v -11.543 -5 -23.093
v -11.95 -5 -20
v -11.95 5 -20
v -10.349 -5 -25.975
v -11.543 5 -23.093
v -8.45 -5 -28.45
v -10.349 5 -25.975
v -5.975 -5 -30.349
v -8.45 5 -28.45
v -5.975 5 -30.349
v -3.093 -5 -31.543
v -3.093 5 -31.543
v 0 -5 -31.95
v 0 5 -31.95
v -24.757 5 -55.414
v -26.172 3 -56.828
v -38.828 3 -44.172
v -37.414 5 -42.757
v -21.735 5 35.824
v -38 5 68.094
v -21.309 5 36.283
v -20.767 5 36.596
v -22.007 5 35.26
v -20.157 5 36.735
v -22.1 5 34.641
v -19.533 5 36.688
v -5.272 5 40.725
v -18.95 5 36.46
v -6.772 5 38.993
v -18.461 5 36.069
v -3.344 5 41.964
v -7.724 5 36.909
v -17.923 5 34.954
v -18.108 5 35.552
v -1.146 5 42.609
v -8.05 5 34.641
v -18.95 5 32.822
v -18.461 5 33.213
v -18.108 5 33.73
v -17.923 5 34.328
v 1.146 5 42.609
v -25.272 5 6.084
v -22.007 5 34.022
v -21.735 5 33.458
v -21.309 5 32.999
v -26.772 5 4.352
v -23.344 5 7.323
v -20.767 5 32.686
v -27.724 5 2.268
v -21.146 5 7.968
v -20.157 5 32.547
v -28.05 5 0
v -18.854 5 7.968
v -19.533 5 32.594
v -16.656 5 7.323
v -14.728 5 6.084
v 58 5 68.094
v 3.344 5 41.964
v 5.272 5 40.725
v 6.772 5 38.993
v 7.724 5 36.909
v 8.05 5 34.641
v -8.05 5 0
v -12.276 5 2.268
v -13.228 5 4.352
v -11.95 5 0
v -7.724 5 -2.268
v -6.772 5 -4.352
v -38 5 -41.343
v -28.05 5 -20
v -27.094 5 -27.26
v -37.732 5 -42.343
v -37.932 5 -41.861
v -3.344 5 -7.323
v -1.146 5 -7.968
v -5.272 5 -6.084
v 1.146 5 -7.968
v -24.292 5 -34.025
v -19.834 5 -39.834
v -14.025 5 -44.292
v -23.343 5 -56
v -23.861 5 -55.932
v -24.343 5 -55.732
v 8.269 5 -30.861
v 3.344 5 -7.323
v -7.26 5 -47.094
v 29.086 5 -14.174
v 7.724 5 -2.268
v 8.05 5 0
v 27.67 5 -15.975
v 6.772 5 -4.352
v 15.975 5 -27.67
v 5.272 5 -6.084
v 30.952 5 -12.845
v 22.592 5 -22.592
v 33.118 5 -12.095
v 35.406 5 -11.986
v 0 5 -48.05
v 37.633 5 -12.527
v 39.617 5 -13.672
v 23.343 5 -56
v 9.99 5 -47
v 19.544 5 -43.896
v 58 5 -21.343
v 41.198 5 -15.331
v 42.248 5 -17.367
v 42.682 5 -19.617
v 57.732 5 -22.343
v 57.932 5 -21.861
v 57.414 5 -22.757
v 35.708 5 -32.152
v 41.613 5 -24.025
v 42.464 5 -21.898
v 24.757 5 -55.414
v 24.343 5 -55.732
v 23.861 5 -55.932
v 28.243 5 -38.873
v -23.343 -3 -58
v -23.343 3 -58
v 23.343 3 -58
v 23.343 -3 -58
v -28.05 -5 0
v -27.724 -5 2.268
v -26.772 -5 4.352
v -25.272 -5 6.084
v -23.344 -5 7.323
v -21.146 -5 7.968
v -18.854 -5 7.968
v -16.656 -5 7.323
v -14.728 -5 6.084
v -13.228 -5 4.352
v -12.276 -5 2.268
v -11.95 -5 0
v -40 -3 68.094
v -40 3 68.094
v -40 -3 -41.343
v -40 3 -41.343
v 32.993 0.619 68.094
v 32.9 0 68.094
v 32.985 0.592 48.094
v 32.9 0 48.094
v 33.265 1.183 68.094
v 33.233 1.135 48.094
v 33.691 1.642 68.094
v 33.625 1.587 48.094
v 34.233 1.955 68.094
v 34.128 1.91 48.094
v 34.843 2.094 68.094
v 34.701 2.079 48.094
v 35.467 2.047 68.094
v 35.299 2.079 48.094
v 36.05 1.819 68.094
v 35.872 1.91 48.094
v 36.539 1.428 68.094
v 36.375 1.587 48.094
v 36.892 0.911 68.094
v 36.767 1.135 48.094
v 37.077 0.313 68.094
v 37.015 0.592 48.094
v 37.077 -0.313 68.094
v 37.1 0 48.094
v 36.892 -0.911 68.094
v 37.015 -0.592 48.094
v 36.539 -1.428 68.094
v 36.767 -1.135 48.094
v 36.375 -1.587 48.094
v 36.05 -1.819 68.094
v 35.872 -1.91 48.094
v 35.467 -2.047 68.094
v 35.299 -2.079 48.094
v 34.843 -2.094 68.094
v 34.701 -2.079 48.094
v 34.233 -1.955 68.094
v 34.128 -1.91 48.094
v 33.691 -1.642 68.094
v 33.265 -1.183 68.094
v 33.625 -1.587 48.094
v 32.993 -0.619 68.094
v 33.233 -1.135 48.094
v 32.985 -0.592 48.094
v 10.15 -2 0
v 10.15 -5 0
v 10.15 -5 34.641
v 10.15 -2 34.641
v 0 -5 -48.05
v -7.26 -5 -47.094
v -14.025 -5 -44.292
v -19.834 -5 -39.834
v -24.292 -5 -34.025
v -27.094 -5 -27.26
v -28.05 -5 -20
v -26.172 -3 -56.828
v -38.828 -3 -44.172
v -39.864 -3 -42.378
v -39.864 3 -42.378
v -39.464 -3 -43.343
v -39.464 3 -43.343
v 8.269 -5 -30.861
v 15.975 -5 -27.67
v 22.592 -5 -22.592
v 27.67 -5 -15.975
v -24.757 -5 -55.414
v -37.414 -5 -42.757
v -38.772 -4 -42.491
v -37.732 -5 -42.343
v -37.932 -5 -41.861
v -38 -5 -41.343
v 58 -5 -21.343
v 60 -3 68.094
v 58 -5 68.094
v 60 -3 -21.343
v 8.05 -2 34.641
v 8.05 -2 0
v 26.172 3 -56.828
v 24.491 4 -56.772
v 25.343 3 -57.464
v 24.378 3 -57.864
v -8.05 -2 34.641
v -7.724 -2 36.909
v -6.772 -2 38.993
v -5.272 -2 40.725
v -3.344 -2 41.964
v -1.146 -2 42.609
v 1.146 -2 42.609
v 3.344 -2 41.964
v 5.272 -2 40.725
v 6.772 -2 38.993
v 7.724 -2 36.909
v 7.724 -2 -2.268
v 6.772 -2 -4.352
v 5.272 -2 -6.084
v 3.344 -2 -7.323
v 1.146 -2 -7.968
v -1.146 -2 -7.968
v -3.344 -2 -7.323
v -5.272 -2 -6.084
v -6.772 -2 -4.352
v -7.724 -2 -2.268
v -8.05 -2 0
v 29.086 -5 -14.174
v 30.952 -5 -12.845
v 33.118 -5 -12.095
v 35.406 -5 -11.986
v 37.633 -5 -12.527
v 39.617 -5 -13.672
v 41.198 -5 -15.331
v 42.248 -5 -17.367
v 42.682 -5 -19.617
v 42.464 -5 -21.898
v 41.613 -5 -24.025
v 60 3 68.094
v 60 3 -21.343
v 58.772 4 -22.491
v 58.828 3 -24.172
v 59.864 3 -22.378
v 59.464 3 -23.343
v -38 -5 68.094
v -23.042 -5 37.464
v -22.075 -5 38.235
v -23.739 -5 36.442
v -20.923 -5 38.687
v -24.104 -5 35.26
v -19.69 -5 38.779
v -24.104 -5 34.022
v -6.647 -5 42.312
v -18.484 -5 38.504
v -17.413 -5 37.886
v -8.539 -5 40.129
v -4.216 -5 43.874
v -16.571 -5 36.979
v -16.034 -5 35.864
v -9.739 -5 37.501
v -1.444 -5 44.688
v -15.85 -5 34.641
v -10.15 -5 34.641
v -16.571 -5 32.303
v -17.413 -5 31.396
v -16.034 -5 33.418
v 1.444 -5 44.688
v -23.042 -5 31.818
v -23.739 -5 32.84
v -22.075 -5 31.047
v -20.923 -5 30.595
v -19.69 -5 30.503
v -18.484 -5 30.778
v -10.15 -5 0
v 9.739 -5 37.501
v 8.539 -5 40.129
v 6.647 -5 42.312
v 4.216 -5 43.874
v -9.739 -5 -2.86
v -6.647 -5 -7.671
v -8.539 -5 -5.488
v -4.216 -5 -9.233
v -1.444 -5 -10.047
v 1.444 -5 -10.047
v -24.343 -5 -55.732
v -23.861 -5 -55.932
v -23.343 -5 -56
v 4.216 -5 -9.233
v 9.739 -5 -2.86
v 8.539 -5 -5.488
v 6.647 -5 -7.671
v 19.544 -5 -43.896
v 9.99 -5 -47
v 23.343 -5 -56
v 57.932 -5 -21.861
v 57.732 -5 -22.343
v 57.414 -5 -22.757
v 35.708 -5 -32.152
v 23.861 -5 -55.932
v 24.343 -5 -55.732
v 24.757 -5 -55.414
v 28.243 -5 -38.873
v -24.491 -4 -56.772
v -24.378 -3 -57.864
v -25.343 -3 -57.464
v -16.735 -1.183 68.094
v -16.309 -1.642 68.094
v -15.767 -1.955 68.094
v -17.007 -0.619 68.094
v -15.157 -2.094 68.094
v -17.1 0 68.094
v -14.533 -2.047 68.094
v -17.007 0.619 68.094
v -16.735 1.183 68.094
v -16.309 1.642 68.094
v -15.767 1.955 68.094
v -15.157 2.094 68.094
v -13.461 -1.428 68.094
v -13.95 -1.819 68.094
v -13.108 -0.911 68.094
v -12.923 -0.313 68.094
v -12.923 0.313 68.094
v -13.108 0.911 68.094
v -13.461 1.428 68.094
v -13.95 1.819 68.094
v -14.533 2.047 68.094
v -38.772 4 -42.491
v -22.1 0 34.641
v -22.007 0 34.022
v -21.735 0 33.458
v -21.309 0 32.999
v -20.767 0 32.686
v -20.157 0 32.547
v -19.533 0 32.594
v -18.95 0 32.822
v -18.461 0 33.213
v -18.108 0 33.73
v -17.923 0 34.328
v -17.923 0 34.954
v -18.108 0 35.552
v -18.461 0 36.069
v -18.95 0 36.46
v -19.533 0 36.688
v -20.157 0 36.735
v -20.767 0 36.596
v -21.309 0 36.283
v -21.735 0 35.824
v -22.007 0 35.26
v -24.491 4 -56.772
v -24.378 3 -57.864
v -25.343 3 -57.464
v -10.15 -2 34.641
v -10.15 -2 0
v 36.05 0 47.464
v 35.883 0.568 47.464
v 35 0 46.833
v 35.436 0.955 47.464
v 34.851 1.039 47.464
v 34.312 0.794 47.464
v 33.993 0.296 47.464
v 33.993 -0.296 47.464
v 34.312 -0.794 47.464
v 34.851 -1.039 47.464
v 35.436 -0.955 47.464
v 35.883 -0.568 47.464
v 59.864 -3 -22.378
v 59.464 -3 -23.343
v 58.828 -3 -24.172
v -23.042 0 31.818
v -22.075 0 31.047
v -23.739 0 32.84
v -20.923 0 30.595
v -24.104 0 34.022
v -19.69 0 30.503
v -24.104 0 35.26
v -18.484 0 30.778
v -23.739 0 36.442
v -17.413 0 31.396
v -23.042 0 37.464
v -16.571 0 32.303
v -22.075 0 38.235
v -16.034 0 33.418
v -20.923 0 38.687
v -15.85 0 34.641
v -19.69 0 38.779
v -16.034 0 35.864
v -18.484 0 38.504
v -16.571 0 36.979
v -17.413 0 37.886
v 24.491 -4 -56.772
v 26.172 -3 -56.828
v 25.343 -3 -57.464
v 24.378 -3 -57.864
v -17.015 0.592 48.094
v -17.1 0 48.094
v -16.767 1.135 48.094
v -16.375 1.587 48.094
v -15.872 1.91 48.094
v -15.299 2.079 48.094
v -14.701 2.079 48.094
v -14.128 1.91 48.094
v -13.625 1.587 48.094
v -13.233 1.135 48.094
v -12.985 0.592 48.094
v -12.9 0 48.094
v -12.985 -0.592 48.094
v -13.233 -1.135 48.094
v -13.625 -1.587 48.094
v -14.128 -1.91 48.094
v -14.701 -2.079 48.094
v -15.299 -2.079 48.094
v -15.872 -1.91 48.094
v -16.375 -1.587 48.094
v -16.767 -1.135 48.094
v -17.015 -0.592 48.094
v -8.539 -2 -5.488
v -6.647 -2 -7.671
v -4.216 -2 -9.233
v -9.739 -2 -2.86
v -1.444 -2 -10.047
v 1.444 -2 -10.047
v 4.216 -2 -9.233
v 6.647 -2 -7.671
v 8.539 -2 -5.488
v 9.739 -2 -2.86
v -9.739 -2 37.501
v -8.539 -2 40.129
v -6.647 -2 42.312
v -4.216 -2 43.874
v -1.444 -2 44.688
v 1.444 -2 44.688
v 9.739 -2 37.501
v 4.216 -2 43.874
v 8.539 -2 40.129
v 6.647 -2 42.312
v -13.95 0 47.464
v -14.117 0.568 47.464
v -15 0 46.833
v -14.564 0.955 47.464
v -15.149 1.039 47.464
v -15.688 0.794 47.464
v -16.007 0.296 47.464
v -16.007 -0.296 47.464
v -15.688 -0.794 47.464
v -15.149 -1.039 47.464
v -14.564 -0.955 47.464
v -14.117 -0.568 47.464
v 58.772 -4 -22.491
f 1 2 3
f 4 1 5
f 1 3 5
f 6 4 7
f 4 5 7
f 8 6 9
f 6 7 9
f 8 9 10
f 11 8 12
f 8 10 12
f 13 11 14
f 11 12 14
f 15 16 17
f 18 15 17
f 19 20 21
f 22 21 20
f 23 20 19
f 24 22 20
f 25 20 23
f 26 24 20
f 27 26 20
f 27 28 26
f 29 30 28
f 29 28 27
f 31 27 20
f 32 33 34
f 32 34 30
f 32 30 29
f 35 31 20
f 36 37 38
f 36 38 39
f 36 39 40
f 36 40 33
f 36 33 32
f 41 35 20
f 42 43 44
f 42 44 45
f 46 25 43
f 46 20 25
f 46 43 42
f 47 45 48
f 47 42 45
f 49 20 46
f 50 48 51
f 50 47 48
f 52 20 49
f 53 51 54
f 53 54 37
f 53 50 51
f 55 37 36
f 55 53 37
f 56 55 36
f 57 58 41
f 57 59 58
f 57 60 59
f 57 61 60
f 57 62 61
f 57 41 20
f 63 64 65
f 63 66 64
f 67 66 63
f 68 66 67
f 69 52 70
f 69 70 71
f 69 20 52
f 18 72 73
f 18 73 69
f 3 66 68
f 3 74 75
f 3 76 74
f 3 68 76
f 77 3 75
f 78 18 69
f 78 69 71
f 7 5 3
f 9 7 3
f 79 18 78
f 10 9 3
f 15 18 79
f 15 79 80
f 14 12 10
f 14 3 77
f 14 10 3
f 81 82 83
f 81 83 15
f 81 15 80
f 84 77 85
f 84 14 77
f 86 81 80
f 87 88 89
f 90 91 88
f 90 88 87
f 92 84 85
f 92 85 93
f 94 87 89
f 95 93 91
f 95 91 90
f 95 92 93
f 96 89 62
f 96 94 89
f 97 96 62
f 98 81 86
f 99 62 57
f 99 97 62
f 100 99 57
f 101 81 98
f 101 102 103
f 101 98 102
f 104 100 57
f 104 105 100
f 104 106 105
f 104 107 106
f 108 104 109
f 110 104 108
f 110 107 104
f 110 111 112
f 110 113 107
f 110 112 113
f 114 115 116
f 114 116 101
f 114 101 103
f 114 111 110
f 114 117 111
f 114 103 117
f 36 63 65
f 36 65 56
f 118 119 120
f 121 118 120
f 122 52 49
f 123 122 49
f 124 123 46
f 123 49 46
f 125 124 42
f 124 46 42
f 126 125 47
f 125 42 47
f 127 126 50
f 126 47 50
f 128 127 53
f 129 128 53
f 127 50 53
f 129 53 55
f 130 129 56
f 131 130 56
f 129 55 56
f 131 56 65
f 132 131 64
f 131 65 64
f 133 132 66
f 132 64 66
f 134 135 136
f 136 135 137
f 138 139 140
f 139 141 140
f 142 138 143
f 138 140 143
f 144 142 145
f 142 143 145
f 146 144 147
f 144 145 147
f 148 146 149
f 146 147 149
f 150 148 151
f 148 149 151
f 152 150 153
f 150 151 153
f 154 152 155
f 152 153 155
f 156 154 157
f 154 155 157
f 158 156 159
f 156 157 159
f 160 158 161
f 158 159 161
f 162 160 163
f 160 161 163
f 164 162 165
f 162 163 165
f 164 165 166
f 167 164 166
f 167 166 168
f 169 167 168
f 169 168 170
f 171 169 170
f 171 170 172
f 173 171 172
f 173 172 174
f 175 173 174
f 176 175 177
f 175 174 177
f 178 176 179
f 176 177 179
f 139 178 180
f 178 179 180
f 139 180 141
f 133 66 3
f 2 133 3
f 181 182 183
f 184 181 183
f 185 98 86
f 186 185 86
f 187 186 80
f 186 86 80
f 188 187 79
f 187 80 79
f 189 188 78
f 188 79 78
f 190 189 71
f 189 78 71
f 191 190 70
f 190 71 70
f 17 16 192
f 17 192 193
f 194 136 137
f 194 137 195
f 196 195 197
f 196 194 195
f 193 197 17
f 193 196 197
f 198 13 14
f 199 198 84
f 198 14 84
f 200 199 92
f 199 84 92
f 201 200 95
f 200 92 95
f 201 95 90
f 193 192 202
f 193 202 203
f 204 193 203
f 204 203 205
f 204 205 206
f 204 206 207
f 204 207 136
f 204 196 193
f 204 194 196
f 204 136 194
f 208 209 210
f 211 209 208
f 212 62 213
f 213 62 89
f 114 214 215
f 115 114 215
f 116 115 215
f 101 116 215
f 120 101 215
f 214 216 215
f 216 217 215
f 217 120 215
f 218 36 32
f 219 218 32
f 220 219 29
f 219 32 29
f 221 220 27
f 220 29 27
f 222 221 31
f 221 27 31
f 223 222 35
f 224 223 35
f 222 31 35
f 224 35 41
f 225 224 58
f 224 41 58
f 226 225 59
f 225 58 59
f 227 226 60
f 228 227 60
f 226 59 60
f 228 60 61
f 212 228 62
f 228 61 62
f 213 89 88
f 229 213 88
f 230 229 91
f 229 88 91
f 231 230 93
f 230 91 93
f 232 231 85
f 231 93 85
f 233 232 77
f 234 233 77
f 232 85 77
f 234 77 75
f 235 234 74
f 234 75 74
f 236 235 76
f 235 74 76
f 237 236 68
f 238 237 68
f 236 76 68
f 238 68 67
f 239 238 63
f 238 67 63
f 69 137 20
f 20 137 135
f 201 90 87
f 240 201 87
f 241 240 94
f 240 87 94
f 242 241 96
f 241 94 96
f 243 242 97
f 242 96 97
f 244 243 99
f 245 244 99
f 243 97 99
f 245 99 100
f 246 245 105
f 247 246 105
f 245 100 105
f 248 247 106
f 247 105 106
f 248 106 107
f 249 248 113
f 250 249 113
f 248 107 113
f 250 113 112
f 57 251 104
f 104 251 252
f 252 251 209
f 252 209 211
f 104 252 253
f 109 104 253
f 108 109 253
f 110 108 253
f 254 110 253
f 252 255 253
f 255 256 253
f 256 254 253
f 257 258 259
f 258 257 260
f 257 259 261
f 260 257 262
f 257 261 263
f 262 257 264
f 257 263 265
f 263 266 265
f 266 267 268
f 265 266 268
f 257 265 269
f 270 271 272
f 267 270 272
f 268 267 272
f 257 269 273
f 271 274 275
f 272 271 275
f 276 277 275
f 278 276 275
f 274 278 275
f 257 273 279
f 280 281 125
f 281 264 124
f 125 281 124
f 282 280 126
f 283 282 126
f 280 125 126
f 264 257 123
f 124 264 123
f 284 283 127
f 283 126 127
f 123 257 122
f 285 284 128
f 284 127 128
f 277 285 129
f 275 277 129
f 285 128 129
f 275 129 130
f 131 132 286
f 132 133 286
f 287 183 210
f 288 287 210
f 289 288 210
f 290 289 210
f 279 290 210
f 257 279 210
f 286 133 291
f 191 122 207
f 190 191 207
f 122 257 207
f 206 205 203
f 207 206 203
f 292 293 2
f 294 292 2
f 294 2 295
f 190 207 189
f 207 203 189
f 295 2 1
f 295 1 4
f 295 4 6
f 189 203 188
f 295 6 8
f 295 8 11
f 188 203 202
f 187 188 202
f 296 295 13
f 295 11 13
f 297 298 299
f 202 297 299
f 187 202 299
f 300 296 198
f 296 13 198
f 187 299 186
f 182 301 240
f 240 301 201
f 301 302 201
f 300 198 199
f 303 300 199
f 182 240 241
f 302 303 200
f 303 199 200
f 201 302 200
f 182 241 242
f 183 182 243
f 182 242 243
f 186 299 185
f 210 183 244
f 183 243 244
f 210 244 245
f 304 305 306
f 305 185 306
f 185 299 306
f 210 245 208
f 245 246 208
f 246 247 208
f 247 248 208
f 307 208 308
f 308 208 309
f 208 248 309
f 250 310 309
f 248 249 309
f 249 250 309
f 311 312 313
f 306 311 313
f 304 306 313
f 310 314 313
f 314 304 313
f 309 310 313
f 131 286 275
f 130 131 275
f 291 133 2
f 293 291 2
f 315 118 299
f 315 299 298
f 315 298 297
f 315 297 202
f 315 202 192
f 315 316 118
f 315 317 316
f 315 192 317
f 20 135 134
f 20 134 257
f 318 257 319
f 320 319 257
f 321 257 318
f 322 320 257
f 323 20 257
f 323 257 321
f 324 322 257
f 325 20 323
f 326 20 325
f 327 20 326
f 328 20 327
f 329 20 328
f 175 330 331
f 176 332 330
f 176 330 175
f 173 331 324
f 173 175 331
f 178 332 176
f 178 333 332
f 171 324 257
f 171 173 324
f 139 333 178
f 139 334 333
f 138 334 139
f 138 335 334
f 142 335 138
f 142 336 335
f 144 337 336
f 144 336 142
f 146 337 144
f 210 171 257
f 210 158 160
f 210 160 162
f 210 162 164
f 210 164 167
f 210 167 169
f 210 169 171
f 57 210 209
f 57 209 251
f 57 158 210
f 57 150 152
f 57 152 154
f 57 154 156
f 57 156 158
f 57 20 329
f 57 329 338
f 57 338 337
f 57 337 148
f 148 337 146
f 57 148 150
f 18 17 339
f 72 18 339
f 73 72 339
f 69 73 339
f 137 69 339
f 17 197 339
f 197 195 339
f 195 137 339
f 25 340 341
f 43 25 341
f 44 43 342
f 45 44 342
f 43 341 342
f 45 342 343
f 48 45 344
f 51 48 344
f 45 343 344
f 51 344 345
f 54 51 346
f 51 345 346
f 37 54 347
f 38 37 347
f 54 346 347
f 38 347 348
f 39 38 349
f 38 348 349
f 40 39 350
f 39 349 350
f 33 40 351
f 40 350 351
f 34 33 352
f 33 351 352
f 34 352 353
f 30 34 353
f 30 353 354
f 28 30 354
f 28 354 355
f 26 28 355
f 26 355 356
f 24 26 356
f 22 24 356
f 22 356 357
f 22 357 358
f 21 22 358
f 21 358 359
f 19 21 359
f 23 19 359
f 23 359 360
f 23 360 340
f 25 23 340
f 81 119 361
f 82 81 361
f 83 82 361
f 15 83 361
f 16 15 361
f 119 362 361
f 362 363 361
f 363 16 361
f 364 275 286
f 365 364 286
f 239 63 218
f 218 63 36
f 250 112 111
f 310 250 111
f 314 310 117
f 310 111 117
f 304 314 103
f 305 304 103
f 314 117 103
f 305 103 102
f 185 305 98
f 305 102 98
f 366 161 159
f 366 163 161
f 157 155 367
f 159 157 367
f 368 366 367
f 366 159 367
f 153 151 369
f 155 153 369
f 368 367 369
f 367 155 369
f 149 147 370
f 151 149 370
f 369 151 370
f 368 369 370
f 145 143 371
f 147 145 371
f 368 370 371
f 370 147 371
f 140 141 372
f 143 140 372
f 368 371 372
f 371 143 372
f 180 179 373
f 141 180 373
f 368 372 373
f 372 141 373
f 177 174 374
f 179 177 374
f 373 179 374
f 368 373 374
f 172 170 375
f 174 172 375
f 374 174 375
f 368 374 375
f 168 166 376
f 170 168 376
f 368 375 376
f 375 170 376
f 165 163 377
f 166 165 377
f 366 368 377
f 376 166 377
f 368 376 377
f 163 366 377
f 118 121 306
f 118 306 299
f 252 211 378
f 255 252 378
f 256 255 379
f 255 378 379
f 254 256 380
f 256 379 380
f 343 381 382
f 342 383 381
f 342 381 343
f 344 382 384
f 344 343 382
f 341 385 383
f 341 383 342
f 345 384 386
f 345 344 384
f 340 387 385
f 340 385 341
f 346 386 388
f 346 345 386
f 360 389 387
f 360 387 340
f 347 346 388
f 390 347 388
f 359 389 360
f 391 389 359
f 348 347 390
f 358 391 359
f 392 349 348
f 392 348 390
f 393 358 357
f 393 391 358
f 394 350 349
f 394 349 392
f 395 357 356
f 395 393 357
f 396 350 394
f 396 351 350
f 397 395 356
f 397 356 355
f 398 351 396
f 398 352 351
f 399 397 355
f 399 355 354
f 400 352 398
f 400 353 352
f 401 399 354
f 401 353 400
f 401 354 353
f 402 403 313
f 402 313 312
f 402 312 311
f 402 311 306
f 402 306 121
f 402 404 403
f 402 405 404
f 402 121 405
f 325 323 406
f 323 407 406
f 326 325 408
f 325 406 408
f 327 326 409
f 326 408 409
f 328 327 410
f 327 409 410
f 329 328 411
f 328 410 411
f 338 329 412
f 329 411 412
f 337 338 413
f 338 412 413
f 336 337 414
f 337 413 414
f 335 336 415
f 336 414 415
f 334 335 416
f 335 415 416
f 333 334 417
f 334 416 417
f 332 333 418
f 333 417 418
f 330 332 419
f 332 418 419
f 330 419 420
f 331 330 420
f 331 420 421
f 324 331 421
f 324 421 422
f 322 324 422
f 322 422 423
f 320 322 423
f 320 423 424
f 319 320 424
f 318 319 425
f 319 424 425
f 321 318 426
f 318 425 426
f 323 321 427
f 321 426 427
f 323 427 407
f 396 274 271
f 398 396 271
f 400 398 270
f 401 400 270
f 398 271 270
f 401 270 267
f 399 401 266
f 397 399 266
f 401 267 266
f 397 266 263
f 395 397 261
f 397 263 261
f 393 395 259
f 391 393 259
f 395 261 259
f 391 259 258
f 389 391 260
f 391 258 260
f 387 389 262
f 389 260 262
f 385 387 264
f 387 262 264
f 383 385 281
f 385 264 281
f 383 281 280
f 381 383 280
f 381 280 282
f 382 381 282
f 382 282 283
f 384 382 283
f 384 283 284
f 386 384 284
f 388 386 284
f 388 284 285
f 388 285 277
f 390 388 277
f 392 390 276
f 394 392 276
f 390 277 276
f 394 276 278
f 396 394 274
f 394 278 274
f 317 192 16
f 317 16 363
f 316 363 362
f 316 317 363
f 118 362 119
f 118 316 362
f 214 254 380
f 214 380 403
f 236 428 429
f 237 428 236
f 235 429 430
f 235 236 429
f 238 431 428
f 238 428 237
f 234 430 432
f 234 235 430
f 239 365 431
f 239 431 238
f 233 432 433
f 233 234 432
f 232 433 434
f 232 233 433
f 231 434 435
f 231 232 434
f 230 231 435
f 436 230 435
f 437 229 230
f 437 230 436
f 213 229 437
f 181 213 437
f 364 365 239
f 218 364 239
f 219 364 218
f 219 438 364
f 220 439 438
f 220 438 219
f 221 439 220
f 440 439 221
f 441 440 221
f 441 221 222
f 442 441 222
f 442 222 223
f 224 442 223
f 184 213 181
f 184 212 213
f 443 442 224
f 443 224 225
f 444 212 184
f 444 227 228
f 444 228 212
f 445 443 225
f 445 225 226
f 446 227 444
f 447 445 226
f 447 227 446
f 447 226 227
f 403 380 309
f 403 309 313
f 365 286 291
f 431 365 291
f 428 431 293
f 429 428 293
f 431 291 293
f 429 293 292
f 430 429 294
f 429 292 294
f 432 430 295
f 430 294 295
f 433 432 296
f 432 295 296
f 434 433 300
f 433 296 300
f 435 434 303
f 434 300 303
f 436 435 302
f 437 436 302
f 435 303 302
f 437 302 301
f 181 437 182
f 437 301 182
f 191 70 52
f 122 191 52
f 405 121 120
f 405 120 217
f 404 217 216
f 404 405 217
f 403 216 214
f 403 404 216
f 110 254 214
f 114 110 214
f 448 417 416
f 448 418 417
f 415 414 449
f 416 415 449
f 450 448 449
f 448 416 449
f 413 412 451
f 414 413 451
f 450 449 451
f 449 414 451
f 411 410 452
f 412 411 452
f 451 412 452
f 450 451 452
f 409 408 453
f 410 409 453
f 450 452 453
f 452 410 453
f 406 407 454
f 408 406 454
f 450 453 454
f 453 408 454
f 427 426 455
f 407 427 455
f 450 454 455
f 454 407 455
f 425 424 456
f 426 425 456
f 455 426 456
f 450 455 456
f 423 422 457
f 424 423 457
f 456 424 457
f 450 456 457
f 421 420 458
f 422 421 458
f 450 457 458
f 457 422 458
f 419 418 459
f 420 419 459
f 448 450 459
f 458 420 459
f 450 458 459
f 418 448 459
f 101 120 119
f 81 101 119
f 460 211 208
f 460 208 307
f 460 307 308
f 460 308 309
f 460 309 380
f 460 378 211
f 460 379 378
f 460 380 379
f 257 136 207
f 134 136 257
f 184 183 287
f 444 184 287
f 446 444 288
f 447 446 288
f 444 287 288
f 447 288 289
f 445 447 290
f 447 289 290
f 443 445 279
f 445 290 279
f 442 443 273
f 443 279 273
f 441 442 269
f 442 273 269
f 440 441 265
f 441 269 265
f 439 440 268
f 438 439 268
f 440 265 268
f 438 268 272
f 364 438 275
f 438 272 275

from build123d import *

# Parameters (mm, degrees)
SKETCH1_W                 = 100
SKETCH1_H                 = 126.094412
BOSS_EXTRUDE1_DEPTH       = 5
SLOTS_DEPTH               = 11
CUT_EXTRUDE6_DEPTH        = 3
M5X0_8_TAPPED_HOLE2_D     = 4.2
SKETCH13_R                = 4.15
CUT_EXTRUDE7_DEPTH        = 5
M5X0_8_TAPPED_HOLE1_D     = 4.2
M5X0_8_TAPPED_HOLE1_DEPTH = 20
M5X0_8_TAPPED_HOLE1_TIP   = 1.2618073
CUT_EXTRUDE2_DEPTH        = 11
CUT_EXTRUDE3_DEPTH        = 11
FILLET1_R                 = 4
CHAMFER1_SIZE             = 2


with BuildPart() as part:
    # Sketch1 → Boss-Extrude1 (new body, symmetric)
    with BuildSketch(Plane(origin=(0, 0, 0), x_dir=(1, 0, 0), z_dir=(0, 1, 0))):
        with Locations((10, -5.047206)):
            Rectangle(SKETCH1_W, SKETCH1_H)
    extrude(amount=BOSS_EXTRUDE1_DEPTH, both=True)

    # Sketch3 → Slots (cut, through all)
    with BuildSketch(Plane(origin=(0, 5, 0), x_dir=(1, 0, 0), z_dir=(0, 1, 0))):
        with BuildLine():
            Line((-8.05, 0), (-8.05, -34.641016151))
            ThreePointArc((-8.05, -34.641016151), (0, -42.691016151), (8.05, -34.641016151))
            Line((8.05, -34.641016151), (8.05, 0))
            ThreePointArc((8.05, 0), (0, 8.05), (-8.05, 0))
        make_face()
        with BuildLine():
            Line((-11.95, 0), (-11.95, 20))
            ThreePointArc((-11.95, 20), (-8.449926035, 28.449926035), (0, 31.95))
            ThreePointArc((0, 31.95), (15.975, 27.669511651), (27.669511651, 15.975))
            ThreePointArc((27.669511651, 15.975), (38.666016151, 13.0284955), (41.612520652, 24.025))
            ThreePointArc((41.612520652, 24.025), (24.025, 41.612520652), (0, 48.05))
            ThreePointArc((0, 48.05), (-19.834345212, 39.834345212), (-28.05, 20))
            Line((-28.05, 20), (-28.05, 0))
            ThreePointArc((-28.05, 0), (-20, -8.05), (-11.95, 0))
        make_face()
    extrude(amount=-SLOTS_DEPTH, mode=Mode.SUBTRACT)

    # Sketch12 → Cut-Extrude6 (cut)
    with BuildSketch(Plane.XZ.offset(5)):
        with BuildLine():
            Line((10.15, 0), (10.15, 34.641016151))
            ThreePointArc((10.15, 34.641016151), (0, 44.791016151), (-10.15, 34.641016151))
            Line((-10.15, 34.641016151), (-10.15, 0))
            ThreePointArc((-10.15, 0), (0, -10.15), (10.15, 0))
        make_face()
    extrude(amount=-CUT_EXTRUDE6_DEPTH, mode=Mode.SUBTRACT)

    # M5x0.8 Tapped Hole2 (through all)
    with Locations(Plane(origin=(0, 5, 0), x_dir=(1, 0, 0), z_dir=(0, 1, 0))):
        with Locations((-20, -34.641016151)):
            Hole(M5X0_8_TAPPED_HOLE2_D / 2)

    # Sketch13 → Cut-Extrude7 (cut)
    with BuildSketch(Plane.XZ.offset(5)):
        with Locations((-20, 34.641016151)):
            Circle(SKETCH13_R)
    extrude(amount=-CUT_EXTRUDE7_DEPTH, mode=Mode.SUBTRACT)

    # M5x0.8 Tapped Hole1
    with Locations(Plane.XY.offset(68.094412)):
        with Locations((-15, 0), (35, 0)):
            Hole(M5X0_8_TAPPED_HOLE1_D / 2, depth=M5X0_8_TAPPED_HOLE1_DEPTH)
            with Locations((0, 0, -(M5X0_8_TAPPED_HOLE1_DEPTH + M5X0_8_TAPPED_HOLE1_TIP / 2))):  # 118° drill point
                Cone(0, M5X0_8_TAPPED_HOLE1_D / 2, M5X0_8_TAPPED_HOLE1_TIP, mode=Mode.SUBTRACT)

    # Sketch4 → Cut-Extrude2 (cut, through all)
    with BuildSketch(Plane(origin=(0, 5, 0), x_dir=(1, 0, 0), z_dir=(0, 1, 0))):
        Polygon((-40, 43), (-40, 58), (-25, 58), align=None)
    extrude(amount=-CUT_EXTRUDE2_DEPTH, mode=Mode.SUBTRACT)

    # Sketch5 → Cut-Extrude3 (cut, through all)
    with BuildSketch(Plane(origin=(0, 5, 0), x_dir=(1, 0, 0), z_dir=(0, 1, 0))):
        Polygon((25, 58), (60, 58), (60, 23), align=None)
    extrude(amount=-CUT_EXTRUDE3_DEPTH, mode=Mode.SUBTRACT)

    # Fillet1
    fillet1_edges = [part.edges().sort_by_distance(p)[0] for p in [
        (-25, 0, -58),
        (-40, 0, -43),
        (60, 0, -23),
        (25, 0, -58),
    ]]
    fillet(fillet1_edges, radius=FILLET1_R)

    # Chamfer1
    chamfer1_edges = [part.edges().sort_by_distance(p)[0] for p in [
        (42.5, 5, -40.5),
        (0, 5, -58),
        (-32.5, 5, -50.5),
        (-40, 5, 13.375633125),
        (-39.69551813, 5, -42.87387948),
        (-24.87387948, 5, -57.69551813),
        (24.87387948, 5, -57.69551813),
        (59.69551813, 5, -22.87387948),
        (60, 5, 23.375633125),
        (42.5, -5, -40.5),
        (-40, -5, 13.375633125),
        (-32.5, -5, -50.5),
        (0, -5, -58),
        (-39.69551813, -5, -42.87387948),
        (-24.87387948, -5, -57.69551813),
        (24.87387948, -5, -57.69551813),
        (59.69551813, -5, -22.87387948),
        (60, -5, 23.375633125),
    ]]
    chamfer(chamfer1_edges, length=CHAMFER1_SIZE)


solid = part.part
